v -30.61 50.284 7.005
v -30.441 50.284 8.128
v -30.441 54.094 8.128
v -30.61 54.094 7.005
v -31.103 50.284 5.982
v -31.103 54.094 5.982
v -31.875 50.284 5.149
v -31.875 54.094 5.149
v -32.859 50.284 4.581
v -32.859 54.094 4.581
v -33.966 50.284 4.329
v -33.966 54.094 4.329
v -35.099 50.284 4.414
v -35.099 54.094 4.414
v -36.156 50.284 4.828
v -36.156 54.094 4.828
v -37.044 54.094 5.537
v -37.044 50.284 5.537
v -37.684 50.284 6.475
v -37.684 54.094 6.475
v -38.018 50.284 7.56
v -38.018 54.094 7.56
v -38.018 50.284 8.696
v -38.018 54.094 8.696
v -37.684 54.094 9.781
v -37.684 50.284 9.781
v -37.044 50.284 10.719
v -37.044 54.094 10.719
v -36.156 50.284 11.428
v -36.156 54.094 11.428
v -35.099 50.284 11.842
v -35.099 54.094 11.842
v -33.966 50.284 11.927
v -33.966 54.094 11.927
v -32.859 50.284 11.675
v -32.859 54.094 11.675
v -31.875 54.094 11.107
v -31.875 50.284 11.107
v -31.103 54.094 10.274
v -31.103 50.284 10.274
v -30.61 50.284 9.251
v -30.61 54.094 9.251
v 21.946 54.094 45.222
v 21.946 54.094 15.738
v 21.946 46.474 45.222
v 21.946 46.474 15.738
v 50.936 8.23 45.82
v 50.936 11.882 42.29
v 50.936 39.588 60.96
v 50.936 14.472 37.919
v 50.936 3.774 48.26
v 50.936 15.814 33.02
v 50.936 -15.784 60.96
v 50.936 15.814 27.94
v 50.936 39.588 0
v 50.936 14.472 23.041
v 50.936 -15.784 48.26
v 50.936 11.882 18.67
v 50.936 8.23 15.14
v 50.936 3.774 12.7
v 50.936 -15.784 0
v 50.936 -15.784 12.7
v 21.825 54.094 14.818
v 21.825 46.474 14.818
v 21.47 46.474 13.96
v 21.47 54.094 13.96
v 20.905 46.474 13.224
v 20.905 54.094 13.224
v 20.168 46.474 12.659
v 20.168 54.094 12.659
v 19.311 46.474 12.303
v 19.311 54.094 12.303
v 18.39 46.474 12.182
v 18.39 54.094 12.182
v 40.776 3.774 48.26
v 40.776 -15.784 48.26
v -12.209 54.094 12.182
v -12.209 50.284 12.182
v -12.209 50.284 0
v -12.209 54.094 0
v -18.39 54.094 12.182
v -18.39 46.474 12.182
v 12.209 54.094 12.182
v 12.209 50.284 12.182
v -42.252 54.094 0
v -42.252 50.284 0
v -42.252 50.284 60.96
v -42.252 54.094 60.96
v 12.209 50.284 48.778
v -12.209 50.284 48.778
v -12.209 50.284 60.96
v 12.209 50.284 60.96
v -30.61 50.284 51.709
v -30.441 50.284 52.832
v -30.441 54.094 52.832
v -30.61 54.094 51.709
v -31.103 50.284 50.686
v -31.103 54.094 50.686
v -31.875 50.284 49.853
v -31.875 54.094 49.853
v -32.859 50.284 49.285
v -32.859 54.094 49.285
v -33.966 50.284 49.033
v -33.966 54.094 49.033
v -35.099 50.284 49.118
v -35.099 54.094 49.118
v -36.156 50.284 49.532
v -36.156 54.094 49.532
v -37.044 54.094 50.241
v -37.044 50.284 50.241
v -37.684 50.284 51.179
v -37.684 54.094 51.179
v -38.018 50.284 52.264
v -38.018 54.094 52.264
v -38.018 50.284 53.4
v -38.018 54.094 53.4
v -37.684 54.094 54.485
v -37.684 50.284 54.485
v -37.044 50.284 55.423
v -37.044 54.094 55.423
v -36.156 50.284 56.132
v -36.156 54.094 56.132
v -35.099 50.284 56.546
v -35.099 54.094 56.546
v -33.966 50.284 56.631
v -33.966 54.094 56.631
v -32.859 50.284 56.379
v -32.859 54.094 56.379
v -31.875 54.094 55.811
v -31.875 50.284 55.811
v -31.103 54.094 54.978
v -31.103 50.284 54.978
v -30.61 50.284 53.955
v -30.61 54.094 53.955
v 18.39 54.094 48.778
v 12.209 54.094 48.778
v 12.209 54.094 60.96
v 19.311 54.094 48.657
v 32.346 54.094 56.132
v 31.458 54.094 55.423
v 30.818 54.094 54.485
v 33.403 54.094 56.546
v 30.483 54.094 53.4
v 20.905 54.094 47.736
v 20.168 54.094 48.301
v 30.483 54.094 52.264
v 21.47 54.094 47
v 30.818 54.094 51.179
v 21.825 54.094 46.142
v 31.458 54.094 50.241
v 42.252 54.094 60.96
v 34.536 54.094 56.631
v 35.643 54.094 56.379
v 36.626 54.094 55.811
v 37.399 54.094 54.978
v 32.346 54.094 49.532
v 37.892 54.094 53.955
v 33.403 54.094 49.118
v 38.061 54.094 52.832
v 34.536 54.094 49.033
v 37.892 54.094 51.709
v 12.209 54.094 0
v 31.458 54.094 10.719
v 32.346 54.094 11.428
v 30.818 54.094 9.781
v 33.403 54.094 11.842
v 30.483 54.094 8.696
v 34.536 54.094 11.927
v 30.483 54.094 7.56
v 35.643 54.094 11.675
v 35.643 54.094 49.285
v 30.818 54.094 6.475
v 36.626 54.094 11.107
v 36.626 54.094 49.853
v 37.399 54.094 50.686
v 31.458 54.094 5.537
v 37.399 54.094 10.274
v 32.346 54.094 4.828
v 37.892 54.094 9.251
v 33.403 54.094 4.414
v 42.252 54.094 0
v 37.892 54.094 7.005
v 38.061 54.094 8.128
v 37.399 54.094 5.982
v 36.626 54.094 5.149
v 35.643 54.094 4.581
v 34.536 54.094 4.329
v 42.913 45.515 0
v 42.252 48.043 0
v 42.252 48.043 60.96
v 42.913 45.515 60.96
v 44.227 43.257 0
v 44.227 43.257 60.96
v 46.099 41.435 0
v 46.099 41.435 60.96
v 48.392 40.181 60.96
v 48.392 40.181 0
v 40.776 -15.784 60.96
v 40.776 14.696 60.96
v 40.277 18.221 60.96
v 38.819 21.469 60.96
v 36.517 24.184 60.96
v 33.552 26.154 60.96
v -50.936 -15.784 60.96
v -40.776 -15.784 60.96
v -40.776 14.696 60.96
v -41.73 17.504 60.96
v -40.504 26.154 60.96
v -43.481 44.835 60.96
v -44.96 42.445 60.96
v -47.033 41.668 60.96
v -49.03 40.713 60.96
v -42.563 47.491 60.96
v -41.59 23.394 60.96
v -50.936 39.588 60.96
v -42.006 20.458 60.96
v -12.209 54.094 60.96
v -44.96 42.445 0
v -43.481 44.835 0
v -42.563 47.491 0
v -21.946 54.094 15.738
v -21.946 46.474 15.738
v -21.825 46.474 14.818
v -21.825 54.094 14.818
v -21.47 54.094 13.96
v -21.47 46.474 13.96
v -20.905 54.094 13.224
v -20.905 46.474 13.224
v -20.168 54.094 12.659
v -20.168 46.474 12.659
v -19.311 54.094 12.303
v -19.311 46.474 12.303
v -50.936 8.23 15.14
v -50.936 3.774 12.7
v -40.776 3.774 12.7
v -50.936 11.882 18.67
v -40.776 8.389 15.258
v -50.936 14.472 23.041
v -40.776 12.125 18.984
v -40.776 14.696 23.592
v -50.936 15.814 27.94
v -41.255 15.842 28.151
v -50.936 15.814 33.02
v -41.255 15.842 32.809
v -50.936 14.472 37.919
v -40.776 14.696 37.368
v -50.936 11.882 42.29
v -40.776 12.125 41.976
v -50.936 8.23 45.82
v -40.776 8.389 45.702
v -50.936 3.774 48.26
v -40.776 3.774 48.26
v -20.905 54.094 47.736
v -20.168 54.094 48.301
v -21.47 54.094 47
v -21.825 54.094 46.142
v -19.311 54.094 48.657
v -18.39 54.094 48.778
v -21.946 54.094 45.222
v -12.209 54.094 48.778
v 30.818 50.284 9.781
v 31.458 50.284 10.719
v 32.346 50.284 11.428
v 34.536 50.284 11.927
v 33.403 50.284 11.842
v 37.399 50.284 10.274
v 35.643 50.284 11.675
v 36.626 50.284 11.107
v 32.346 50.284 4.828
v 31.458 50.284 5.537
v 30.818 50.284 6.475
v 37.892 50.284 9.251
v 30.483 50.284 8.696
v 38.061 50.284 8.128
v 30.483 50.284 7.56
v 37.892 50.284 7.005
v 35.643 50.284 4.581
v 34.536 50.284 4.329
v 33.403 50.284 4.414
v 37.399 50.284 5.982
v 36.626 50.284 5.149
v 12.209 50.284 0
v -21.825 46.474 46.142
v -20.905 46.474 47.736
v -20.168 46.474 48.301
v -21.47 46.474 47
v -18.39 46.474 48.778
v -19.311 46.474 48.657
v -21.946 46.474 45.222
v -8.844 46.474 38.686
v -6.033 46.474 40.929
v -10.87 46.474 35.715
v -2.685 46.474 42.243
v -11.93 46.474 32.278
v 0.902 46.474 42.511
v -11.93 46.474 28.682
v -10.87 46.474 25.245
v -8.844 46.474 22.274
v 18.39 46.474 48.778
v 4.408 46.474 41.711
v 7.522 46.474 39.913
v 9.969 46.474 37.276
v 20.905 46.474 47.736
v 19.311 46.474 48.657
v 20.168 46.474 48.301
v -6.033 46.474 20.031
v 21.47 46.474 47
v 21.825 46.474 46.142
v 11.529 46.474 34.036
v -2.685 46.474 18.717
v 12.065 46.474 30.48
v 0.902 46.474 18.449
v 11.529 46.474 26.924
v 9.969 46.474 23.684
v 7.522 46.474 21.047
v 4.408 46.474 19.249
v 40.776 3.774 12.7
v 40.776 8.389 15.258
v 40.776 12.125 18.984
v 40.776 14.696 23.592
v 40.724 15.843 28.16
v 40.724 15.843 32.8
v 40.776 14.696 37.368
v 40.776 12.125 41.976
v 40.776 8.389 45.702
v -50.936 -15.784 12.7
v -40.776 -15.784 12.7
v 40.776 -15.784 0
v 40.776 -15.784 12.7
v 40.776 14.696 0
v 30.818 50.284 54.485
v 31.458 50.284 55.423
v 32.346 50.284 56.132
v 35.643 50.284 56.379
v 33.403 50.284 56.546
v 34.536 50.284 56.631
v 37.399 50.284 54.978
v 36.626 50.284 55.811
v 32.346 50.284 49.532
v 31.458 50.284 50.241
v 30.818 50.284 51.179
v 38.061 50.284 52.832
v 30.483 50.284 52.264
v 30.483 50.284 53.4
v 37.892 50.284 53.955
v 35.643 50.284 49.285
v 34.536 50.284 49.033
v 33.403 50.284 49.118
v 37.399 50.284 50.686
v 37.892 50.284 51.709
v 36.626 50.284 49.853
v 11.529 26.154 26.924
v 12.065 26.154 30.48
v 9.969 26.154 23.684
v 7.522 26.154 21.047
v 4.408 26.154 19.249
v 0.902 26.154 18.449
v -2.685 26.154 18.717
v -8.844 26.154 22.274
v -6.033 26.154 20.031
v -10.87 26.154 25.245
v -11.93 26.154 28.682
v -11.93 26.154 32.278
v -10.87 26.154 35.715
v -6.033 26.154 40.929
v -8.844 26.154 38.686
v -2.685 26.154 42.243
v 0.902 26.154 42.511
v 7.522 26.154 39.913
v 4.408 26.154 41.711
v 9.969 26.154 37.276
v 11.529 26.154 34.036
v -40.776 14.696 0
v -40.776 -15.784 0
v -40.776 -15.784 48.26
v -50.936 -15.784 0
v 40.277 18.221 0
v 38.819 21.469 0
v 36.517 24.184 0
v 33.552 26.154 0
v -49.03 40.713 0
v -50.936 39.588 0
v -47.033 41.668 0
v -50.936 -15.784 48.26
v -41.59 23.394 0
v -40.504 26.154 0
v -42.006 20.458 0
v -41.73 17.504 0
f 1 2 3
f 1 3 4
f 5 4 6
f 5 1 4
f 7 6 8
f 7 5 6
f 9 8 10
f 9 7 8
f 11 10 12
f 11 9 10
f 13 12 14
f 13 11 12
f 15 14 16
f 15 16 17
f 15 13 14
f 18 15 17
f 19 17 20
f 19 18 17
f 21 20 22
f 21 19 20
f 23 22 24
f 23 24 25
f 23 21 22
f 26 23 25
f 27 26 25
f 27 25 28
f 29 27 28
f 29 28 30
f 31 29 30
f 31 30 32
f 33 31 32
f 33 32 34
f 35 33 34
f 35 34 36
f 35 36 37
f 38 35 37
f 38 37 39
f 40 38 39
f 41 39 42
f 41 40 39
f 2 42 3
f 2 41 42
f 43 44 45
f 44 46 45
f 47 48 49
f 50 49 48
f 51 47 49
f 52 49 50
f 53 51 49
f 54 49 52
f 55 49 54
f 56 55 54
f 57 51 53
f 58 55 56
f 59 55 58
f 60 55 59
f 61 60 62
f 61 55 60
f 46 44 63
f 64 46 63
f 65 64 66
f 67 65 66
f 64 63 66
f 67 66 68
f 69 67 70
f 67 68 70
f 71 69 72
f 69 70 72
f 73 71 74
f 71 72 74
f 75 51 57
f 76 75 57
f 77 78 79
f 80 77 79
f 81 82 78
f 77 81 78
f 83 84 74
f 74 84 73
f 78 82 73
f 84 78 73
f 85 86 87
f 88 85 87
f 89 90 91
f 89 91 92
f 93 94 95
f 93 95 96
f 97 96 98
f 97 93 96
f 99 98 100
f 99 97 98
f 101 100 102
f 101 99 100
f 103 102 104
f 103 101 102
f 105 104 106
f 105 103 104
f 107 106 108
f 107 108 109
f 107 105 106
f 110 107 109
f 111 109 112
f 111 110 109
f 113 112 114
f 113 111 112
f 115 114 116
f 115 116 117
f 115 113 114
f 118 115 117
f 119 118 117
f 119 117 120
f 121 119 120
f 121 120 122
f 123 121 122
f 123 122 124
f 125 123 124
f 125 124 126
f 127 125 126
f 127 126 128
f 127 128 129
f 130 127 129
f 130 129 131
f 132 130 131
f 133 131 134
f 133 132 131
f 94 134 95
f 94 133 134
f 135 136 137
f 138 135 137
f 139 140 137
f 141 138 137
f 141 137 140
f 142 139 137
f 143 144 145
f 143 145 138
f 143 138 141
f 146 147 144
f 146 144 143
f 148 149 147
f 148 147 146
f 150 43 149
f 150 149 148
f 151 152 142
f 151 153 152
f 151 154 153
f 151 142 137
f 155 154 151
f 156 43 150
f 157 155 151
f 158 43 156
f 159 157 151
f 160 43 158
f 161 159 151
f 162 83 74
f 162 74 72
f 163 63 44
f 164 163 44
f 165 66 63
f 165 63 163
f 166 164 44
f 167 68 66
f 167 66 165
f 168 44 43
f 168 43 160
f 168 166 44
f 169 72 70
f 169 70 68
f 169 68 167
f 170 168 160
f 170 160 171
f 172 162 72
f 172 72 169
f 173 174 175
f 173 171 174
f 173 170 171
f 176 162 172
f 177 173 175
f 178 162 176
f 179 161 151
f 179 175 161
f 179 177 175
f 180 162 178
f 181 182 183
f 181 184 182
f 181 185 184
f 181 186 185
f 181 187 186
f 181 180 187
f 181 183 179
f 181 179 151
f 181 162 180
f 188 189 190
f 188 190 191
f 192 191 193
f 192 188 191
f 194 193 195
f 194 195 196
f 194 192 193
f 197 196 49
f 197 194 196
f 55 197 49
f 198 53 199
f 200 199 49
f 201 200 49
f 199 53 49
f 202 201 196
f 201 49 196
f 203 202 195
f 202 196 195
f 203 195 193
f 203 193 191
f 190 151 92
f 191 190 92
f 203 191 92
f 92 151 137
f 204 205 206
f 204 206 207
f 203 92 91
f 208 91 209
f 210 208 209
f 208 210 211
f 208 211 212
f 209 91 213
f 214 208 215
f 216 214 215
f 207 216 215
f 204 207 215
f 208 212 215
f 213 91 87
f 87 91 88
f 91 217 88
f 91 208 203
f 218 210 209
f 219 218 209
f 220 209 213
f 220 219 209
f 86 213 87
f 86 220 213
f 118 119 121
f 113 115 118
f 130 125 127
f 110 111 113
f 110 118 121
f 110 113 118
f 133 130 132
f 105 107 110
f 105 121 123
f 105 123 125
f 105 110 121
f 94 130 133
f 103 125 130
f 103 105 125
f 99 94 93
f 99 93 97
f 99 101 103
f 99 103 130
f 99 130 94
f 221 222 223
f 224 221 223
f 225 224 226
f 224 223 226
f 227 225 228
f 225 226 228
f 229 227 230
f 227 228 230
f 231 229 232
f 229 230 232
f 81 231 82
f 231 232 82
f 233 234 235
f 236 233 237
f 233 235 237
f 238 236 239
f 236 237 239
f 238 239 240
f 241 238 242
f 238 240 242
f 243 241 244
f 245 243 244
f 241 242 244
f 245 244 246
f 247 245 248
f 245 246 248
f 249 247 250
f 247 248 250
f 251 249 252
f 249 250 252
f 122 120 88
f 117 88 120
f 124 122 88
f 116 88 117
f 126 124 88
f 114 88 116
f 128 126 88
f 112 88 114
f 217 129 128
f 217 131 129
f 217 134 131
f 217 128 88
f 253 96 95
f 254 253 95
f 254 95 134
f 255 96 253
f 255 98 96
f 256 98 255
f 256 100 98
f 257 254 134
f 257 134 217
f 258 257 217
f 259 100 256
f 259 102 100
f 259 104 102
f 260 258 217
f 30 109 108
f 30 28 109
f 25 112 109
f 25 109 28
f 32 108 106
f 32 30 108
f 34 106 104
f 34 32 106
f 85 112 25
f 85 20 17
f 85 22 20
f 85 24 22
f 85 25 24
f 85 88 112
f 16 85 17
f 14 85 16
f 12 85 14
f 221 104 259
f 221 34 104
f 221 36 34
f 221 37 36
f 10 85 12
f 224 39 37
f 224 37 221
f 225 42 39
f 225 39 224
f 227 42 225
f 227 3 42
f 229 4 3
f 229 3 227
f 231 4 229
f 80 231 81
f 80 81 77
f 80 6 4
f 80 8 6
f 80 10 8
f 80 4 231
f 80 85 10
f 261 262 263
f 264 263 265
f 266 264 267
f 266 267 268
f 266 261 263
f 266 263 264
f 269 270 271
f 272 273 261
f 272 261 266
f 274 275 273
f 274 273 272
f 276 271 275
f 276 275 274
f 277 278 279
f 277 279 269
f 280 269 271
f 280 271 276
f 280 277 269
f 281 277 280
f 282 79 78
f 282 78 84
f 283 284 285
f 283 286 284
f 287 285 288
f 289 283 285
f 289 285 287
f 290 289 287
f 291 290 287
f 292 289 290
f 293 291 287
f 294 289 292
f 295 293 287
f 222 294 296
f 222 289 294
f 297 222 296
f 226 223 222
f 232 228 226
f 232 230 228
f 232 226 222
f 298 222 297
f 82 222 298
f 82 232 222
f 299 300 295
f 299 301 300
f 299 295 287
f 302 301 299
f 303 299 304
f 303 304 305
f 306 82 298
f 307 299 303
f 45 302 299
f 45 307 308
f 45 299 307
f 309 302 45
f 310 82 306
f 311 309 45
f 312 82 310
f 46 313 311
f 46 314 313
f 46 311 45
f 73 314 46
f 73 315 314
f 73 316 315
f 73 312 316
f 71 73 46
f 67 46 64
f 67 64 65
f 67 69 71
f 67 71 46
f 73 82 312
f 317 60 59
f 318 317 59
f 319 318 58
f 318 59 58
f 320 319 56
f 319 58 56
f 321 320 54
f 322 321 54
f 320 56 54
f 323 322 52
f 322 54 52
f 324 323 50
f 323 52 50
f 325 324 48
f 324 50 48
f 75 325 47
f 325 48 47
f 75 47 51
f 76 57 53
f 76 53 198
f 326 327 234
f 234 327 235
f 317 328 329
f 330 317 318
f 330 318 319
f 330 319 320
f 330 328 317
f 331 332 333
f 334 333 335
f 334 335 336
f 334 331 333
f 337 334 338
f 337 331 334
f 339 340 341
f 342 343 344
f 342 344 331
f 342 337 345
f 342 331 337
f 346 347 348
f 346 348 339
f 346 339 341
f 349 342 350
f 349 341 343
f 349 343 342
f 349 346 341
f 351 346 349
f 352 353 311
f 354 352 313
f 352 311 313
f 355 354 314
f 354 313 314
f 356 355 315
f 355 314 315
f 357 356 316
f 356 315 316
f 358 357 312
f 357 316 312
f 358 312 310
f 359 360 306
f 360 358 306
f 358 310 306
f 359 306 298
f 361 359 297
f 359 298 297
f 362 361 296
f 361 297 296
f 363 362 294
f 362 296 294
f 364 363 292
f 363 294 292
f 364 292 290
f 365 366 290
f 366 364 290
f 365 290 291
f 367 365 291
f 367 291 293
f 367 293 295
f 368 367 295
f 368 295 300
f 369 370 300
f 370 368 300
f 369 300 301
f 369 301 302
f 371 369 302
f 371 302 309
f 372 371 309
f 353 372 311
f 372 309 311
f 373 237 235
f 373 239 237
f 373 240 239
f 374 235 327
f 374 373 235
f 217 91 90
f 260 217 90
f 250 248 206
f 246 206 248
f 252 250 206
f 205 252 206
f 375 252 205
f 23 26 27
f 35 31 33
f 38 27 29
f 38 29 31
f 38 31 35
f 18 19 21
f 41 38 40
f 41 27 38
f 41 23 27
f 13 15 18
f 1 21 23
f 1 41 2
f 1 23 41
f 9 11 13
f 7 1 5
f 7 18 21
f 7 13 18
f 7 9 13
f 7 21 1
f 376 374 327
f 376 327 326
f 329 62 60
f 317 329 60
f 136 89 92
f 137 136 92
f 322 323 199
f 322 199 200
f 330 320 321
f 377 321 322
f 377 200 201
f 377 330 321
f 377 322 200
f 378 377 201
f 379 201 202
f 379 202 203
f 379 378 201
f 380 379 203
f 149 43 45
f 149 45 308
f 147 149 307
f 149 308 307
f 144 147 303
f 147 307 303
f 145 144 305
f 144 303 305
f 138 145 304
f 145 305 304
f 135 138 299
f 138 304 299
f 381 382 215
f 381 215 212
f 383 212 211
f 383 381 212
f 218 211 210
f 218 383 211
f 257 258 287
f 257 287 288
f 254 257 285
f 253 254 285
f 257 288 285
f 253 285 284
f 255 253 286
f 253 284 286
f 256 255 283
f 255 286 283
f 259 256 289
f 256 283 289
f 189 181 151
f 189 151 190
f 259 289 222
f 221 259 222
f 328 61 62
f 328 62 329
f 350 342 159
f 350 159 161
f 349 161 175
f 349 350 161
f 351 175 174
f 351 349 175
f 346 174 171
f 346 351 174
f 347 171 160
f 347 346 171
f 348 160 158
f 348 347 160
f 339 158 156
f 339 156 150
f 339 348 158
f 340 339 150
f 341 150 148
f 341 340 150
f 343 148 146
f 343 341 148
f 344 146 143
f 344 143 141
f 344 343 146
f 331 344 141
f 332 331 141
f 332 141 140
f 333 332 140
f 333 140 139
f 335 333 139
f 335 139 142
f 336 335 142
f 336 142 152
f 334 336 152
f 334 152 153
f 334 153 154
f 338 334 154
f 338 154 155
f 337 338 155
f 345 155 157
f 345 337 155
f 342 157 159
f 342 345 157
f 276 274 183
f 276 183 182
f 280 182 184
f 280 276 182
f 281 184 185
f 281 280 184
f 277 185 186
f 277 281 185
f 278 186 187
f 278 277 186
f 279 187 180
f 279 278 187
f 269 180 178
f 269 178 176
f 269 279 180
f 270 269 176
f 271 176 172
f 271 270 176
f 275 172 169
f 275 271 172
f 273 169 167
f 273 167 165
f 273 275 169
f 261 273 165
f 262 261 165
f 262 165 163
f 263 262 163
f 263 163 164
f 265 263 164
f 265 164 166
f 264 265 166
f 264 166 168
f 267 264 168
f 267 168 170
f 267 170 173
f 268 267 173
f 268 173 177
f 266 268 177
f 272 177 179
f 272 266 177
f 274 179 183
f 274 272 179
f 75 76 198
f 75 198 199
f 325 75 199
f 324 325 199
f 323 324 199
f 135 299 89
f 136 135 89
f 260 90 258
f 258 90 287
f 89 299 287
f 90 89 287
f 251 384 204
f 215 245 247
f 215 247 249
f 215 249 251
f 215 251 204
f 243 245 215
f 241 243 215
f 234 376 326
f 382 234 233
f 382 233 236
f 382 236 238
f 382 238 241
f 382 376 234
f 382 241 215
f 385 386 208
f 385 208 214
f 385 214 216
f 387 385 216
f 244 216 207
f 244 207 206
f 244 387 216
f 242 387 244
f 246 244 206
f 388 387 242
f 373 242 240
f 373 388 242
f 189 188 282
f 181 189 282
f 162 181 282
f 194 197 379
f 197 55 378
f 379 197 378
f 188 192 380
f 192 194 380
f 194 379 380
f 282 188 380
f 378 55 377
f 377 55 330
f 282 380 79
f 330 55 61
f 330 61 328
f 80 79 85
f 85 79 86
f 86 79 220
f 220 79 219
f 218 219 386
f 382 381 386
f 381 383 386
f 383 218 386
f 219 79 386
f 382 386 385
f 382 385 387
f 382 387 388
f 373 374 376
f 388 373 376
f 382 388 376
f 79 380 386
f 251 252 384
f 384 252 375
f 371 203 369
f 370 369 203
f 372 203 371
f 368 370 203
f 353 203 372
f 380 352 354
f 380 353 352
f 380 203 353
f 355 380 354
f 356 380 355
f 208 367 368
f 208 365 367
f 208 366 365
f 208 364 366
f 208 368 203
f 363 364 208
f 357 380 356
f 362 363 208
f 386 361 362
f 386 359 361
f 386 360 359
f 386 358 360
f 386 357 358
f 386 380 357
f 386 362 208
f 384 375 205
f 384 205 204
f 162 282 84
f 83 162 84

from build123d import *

# Parameters (mm, degrees)
BOSS_EXTRUDE1_DEPTH     = 60.96
SKETCH4_R               = 12.065
CUT_EXTRUDE3_DEPTH      = 3.81
CUT_EXTRUDE4_DEPTH      = 1
CUT_EXTRUDE4_DEPTH_BACK = 102.872142857
SKETCH7_R               = 3.81
BOSS_EXTRUDE3_DEPTH     = 3.81
CUT_EXTRUDE7_DEPTH      = 3.81
SKETCH11_R              = 12.065
CUT_EXTRUDE8_DEPTH      = 114.3


with BuildPart() as part:
    # Sketch1 → Boss-Extrude1 (new body)
    with BuildSketch(Plane.XY):
        with BuildLine():
            Line((40.776071429, -15.784285714), (40.776071429, 14.695714286))
            ThreePointArc((40.776071429, 14.695714286), (38.819326582, 21.468636013), (33.552060607, 26.154490072))
            Line((33.552060607, 26.154490072), (-40.503928571, 26.154490072))
            ThreePointArc((-40.503928571, 26.154490072), (-42.006230477, 20.457549787), (-40.776071429, 14.695714286))
            Line((-40.776071429, 14.695714286), (-40.776071429, -15.784285714))
            Line((-40.776071429, -15.784285714), (-50.936071429, -15.784285714))
            Line((-50.936071429, -15.784285714), (-50.936071429, 39.587714286))
            ThreePointArc((-50.936071429, 39.587714286), (-48.041649354, 41.212124157), (-44.960126074, 42.445250611))
            ThreePointArc((-44.960126074, 42.445250611), (-42.948064089, 46.137564922), (-42.251938956, 50.284490072))
            Line((-42.251938956, 50.284490072), (-29.309810678, 50.284490072))
            Line((-29.309810678, 50.284490072), (29.309810678, 50.284490072))
            Line((29.309810678, 50.284490072), (42.251938956, 50.284490072))
            Line((42.251938956, 50.284490072), (42.251938956, 48.042823233))
            ThreePointArc((42.251938956, 48.042823233), (45.101391865, 42.282225017), (50.936071429, 39.587714286))
            Line((50.936071429, 39.587714286), (50.936071429, -15.784285714))
            Line((50.936071429, -15.784285714), (40.776071429, -15.784285714))
        make_face()
    extrude(amount=BOSS_EXTRUDE1_DEPTH)

    # Sketch4 → Cut-Extrude3 (cut)
    with BuildSketch(Plane(origin=(0, 46.474490072, 0), x_dir=(1, 0, 0), z_dir=(0, 1, 0))):
        with Locations((0, -30.48)):
            Circle(SKETCH4_R)
    extrude(amount=-CUT_EXTRUDE3_DEPTH, mode=Mode.SUBTRACT)

    # Sketch6 → Cut-Extrude4 (cut, two sides)
    with BuildSketch(Plane(origin=(50.936071429, 0, 0), x_dir=(0, 0, -1), z_dir=(1, 0, 0))) as cut_extrude4_sk:
        with BuildLine():
            Line((-48.26, 3.773714286), (-48.26, -15.784285714))
            Line((-48.26, -15.784285714), (-12.7, -15.784285714))
            Line((-12.7, -15.784285714), (-12.7, 3.773714286))
            ThreePointArc((-12.7, 3.773714286), (-30.48, 15.984554981), (-48.26, 3.773714286))
        make_face()
    extrude(amount=CUT_EXTRUDE4_DEPTH, mode=Mode.SUBTRACT)
    extrude(cut_extrude4_sk.sketch, amount=-CUT_EXTRUDE4_DEPTH_BACK, mode=Mode.SUBTRACT)

    # Sketch7 → Boss-Extrude3 (add)
    with BuildSketch(Plane(origin=(0, 50.284490072, 0), x_dir=(1, 0, 0), z_dir=(0, 1, 0))):
        with BuildLine():
            Line((-12.20867372, -12.182150361), (-12.20867372, 0))
            Line((-12.20867372, 0), (-42.251938956, 0))
            Line((-42.251938956, 0), (-42.251938956, -60.96))
            Line((-42.251938956, -60.96), (-12.20867372, -60.96))
            Line((-12.20867372, -60.96), (-12.20867372, -48.777849639))
            Line((-12.20867372, -48.777849639), (-18.390263021, -48.777849639))
            ThreePointArc((-18.390263021, -48.777849639), (-20.904734735, -47.736321353), (-21.946263021, -45.221849639))
            Line((-21.946263021, -45.221849639), (-21.946263021, -15.738150361))
            ThreePointArc((-21.946263021, -15.738150361), (-20.904734735, -13.223678647), (-18.390263021, -12.182150361))
            Line((-18.390263021, -12.182150361), (-12.20867372, -12.182150361))
        make_face()
        with Locations((-34.250938956, -52.832)):
            Circle(SKETCH7_R, mode=Mode.SUBTRACT)
        with Locations((-34.250938956, -8.128)):
            Circle(SKETCH7_R, mode=Mode.SUBTRACT)
        with BuildLine():
            Line((42.251938956, 0), (12.20867372, 0))
            Line((12.20867372, 0), (12.20867372, -12.182150361))
            Line((12.20867372, -12.182150361), (18.390263021, -12.182150361))
            ThreePointArc((18.390263021, -12.182150361), (20.904734735, -13.223678647), (21.946263021, -15.738150361))
            Line((21.946263021, -15.738150361), (21.946263021, -45.221849639))
            ThreePointArc((21.946263021, -45.221849639), (20.904734735, -47.736321353), (18.390263021, -48.777849639))
            Line((18.390263021, -48.777849639), (12.20867372, -48.777849639))
            Line((12.20867372, -48.777849639), (12.20867372, -60.96))
            Line((12.20867372, -60.96), (42.251938956, -60.96))
            Line((42.251938956, -60.96), (42.251938956, 0))
        make_face()
        with Locations((34.250938956, -52.832)):
            Circle(SKETCH7_R, mode=Mode.SUBTRACT)
        with Locations((34.250938956, -8.128)):
            Circle(SKETCH7_R, mode=Mode.SUBTRACT)
    extrude(amount=BOSS_EXTRUDE3_DEPTH)

    # Sketch8 → Cut-Extrude7 (cut)
    with BuildSketch(Plane(origin=(0, 50.284490072, 0), x_dir=(1, 0, 0), z_dir=(0, 1, 0))):
        Polygon((-12.20867372, -12.182150361), (-18.390263021, -12.182150361), (-18.390263021, -48.777849639), (-12.20867372, -48.777849639), (12.20867372, -48.777849639), (18.390263021, -48.777849639), (18.390263021, -12.182150361), (12.20867372, -12.182150361), align=None)
        with BuildLine():
            Line((-18.390263021, -12.182150361), (-18.390263021, -48.777849639))
            ThreePointArc((-18.390263021, -48.777849639), (-20.904734735, -47.736321353), (-21.946263021, -45.221849639))
            Line((-21.946263021, -45.221849639), (-21.946263021, -15.738150361))
            ThreePointArc((-21.946263021, -15.738150361), (-20.904734735, -13.223678647), (-18.390263021, -12.182150361))
        make_face()
        with BuildLine():
            Line((18.390263021, -12.182150361), (18.390263021, -48.777849639))
            ThreePointArc((18.390263021, -48.777849639), (20.904734735, -47.736321353), (21.946263021, -45.221849639))
            Line((21.946263021, -45.221849639), (21.946263021, -15.738150361))
            ThreePointArc((21.946263021, -15.738150361), (20.904734735, -13.223678647), (18.390263021, -12.182150361))
        make_face()
    extrude(amount=-CUT_EXTRUDE7_DEPTH, mode=Mode.SUBTRACT)

    # Sketch11 → Cut-Extrude8 (cut)
    with BuildSketch(Plane(origin=(0, 0, 0), x_dir=(1, 0, 0), z_dir=(0, 1, 0))):
        with Locations((0, -30.48)):
            Circle(SKETCH11_R)
    extrude(amount=CUT_EXTRUDE8_DEPTH, mode=Mode.SUBTRACT)


solid = part.part
